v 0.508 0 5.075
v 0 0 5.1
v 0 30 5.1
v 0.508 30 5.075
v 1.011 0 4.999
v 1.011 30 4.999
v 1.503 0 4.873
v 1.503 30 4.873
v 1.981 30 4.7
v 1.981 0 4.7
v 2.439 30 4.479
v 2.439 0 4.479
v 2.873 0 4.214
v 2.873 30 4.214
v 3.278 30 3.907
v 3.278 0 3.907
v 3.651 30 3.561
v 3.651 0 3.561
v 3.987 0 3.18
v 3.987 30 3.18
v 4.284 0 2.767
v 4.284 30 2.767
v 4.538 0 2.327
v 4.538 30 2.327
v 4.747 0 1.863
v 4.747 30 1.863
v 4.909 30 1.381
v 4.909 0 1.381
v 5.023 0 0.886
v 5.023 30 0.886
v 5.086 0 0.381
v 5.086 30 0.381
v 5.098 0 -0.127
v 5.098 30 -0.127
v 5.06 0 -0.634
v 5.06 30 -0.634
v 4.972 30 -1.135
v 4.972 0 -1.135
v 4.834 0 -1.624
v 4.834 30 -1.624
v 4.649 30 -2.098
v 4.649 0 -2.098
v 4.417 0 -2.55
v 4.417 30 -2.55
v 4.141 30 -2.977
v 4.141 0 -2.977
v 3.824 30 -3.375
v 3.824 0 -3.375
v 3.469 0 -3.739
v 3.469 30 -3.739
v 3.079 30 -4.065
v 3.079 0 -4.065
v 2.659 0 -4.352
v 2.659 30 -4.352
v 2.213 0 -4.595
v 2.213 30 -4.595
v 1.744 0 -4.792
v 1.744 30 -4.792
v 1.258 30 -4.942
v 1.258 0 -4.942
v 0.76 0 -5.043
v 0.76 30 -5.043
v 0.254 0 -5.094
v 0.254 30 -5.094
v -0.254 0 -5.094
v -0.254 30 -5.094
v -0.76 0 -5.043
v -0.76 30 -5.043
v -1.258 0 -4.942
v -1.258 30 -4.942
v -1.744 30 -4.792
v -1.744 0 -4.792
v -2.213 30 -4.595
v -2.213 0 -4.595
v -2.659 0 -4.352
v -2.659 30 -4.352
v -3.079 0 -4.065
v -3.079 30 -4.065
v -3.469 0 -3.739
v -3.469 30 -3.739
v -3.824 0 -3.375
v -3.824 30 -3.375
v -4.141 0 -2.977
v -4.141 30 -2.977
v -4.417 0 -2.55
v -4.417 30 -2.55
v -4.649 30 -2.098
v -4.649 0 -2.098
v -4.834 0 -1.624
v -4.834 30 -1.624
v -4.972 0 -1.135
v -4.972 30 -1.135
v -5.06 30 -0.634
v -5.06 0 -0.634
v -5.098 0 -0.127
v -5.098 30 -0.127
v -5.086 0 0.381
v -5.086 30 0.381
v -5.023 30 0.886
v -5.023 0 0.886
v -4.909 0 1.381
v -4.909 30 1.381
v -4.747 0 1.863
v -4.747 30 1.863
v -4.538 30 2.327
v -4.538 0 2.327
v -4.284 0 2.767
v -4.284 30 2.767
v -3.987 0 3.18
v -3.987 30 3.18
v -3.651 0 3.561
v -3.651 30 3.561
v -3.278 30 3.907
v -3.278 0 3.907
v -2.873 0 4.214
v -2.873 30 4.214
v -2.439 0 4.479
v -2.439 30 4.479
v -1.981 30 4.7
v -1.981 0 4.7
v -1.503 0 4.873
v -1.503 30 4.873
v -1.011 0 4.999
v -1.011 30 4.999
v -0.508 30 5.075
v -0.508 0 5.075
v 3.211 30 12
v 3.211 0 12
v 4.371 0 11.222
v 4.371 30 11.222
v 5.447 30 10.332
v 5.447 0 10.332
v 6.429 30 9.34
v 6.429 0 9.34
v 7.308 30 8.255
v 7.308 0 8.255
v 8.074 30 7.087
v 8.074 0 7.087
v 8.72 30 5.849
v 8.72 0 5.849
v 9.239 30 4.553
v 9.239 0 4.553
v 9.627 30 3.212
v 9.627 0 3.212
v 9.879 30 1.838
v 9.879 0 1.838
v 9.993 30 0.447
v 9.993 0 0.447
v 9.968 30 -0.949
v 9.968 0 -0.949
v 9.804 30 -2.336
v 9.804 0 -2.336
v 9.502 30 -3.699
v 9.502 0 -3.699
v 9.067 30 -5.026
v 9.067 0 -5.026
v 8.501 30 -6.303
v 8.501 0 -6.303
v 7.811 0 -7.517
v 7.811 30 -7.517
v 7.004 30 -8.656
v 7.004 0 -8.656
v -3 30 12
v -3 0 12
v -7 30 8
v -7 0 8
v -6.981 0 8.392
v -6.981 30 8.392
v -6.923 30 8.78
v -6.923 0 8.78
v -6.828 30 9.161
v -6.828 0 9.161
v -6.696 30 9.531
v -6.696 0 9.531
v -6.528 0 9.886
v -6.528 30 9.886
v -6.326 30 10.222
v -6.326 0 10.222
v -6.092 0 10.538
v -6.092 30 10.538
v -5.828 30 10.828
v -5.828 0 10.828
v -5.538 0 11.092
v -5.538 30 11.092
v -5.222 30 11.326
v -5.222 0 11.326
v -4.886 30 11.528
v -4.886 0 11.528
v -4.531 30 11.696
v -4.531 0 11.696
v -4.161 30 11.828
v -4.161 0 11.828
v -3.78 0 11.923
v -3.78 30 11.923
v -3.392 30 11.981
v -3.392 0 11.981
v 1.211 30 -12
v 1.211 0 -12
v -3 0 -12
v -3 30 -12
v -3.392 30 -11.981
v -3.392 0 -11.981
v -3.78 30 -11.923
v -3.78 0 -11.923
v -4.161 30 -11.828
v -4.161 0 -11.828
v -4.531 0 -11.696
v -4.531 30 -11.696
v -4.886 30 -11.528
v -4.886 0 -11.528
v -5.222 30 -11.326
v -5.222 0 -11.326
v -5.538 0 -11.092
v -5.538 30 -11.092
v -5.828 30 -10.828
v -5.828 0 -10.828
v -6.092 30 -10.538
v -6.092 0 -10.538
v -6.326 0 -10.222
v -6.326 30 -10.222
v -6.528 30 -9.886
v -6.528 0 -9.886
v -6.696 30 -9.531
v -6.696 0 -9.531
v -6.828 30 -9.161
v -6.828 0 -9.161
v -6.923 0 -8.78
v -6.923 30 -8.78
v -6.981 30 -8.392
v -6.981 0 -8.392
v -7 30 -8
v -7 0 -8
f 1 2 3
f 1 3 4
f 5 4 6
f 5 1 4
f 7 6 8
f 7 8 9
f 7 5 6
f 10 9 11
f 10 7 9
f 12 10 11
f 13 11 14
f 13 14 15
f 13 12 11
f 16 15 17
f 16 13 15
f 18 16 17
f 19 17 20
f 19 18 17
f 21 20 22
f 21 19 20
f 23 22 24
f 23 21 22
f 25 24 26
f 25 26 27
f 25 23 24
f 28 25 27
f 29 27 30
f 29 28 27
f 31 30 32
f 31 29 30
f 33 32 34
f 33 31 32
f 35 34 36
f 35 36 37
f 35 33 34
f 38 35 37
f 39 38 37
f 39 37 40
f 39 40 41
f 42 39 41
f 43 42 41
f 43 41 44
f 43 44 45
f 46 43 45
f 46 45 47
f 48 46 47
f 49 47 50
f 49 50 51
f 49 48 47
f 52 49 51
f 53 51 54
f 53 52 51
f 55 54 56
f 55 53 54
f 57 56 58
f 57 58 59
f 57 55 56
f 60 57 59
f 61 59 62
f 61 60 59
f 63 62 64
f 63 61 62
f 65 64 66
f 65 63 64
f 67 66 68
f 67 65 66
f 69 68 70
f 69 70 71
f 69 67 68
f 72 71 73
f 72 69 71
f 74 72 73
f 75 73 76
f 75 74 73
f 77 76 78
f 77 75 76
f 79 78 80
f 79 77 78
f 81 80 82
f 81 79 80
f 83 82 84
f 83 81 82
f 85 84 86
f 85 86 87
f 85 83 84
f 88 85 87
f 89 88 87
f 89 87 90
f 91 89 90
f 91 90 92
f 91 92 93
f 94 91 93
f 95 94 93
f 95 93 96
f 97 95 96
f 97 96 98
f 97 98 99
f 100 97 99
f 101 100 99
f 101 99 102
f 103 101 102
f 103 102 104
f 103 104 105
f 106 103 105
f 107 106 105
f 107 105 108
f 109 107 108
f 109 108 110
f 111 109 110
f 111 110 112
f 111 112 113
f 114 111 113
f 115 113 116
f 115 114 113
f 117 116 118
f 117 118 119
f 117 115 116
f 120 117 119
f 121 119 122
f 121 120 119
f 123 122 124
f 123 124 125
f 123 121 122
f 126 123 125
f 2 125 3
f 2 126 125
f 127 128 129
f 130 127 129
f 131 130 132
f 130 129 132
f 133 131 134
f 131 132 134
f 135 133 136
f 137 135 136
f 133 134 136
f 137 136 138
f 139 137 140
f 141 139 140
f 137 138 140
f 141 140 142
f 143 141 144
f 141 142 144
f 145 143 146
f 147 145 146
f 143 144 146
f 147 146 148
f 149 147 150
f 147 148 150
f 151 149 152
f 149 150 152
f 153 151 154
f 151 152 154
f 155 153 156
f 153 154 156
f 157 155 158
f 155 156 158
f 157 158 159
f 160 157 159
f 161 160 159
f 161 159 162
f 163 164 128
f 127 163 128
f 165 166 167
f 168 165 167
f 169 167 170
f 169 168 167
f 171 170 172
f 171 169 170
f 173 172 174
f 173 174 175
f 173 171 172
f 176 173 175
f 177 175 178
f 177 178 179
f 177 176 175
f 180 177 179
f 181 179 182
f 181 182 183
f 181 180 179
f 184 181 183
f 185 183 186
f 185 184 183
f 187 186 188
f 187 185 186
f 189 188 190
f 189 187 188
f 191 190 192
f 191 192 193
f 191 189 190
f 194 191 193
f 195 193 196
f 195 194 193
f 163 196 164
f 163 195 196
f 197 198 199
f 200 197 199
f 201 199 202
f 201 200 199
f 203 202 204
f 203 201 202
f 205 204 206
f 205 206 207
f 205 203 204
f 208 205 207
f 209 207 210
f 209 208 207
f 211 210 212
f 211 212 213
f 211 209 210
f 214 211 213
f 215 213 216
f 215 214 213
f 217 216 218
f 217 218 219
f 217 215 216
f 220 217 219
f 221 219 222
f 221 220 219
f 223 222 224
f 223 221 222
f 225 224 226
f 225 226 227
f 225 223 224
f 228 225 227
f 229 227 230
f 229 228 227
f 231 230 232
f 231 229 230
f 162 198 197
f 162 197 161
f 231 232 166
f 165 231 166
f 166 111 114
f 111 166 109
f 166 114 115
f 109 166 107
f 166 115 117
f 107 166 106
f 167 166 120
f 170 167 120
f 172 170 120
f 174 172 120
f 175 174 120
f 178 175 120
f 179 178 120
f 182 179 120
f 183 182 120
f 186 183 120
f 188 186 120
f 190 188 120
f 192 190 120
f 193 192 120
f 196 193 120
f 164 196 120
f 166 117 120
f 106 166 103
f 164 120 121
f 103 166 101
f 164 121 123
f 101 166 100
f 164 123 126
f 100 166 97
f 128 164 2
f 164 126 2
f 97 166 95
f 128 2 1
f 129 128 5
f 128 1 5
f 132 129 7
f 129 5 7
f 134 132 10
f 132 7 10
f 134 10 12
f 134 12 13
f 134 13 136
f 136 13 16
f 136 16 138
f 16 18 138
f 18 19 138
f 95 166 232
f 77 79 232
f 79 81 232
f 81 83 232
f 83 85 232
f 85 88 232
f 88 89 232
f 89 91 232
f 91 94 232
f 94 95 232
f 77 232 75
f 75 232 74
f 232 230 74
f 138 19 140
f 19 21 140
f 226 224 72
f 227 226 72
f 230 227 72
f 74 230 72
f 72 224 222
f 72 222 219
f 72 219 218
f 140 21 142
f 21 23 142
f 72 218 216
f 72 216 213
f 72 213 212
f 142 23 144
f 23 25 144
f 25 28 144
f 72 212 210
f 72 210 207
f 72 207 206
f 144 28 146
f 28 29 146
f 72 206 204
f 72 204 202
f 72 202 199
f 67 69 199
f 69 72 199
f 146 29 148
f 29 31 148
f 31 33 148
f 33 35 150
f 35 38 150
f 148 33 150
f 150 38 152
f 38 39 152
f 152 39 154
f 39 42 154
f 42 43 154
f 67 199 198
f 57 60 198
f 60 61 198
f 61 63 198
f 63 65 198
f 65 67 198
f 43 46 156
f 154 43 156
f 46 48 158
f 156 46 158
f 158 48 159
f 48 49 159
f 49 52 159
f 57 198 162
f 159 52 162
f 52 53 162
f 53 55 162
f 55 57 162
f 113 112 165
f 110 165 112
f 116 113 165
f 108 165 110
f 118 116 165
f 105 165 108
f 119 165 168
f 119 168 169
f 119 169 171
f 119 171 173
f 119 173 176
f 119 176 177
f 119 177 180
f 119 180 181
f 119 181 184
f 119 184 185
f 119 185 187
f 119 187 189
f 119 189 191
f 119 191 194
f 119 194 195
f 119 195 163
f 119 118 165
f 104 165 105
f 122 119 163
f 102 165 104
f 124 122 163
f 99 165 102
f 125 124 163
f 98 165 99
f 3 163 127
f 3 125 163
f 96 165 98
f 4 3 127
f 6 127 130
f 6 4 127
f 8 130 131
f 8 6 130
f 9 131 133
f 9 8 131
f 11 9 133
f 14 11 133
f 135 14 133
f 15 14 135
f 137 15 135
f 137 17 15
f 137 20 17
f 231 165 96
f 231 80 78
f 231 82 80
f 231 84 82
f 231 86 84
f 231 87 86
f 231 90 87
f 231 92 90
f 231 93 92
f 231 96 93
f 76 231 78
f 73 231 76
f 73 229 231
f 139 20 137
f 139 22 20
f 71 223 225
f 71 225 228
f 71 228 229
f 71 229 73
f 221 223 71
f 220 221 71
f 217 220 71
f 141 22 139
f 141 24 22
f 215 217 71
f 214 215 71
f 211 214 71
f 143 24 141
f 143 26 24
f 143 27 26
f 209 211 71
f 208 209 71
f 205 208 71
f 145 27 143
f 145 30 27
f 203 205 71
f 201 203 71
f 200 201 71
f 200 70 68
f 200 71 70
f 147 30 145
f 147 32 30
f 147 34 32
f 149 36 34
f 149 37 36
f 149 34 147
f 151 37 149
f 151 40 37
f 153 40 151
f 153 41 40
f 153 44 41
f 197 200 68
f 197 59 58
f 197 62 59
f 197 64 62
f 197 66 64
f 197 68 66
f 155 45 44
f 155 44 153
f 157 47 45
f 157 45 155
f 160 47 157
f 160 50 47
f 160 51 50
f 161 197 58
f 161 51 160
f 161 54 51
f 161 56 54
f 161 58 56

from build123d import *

# Parameters (mm, degrees)
SKETCH1_R           = 5.1
BOSS_EXTRUDE1_DEPTH = 30
FILLET1_R           = 4
CHAMFER1_SIZE       = 2


with BuildPart() as part:
    # Sketch1 → Boss-Extrude1 (new body)
    with BuildSketch(Plane(origin=(0, 0, 0), x_dir=(1, 0, 0), z_dir=(0, 1, 0))):
        with BuildLine():
            Line((3.211102551, 12), (-7, 12))
            Line((-7, 12), (-7, -12))
            Line((-7, -12), (3.211102551, -12))
            ThreePointArc((3.211102551, -12), (10, 0), (3.211102551, 12))
        make_face()
        with Locations(Location((0, 0, 0), (0, 0, 270))):
            Circle(SKETCH1_R, mode=Mode.SUBTRACT)
    extrude(amount=BOSS_EXTRUDE1_DEPTH)

    # Fillet1
    fillet1_edges = [part.edges().sort_by_distance(p)[0] for p in [
        (-7, 15, 12),
        (-7, 15, -12),
    ]]
    fillet(fillet1_edges, radius=FILLET1_R)

    # Chamfer1
    # the kernel refuses this chamfer: 57.143323993, 2 mm, written as the material it takes off along each edge
    with BuildSketch(Plane(origin=(3.211102551, -18.277403027, -12), x_dir=(-1, 0, 0), z_dir=(0, 1, 0))) as chamfer1_piece_1:
        with BuildLine():
            Line((CHAMFER1_SIZE, 0), (-3.792467803, 3.344282846))
            ThreePointArc((-3.792467803, 3.344282846), (-2.856773862, 2.271800551), (0, 0))
            Line((0, 0), (CHAMFER1_SIZE, 0))
        make_face()
    extrude(amount=66.554806053, mode=Mode.SUBTRACT)


solid = part.part
